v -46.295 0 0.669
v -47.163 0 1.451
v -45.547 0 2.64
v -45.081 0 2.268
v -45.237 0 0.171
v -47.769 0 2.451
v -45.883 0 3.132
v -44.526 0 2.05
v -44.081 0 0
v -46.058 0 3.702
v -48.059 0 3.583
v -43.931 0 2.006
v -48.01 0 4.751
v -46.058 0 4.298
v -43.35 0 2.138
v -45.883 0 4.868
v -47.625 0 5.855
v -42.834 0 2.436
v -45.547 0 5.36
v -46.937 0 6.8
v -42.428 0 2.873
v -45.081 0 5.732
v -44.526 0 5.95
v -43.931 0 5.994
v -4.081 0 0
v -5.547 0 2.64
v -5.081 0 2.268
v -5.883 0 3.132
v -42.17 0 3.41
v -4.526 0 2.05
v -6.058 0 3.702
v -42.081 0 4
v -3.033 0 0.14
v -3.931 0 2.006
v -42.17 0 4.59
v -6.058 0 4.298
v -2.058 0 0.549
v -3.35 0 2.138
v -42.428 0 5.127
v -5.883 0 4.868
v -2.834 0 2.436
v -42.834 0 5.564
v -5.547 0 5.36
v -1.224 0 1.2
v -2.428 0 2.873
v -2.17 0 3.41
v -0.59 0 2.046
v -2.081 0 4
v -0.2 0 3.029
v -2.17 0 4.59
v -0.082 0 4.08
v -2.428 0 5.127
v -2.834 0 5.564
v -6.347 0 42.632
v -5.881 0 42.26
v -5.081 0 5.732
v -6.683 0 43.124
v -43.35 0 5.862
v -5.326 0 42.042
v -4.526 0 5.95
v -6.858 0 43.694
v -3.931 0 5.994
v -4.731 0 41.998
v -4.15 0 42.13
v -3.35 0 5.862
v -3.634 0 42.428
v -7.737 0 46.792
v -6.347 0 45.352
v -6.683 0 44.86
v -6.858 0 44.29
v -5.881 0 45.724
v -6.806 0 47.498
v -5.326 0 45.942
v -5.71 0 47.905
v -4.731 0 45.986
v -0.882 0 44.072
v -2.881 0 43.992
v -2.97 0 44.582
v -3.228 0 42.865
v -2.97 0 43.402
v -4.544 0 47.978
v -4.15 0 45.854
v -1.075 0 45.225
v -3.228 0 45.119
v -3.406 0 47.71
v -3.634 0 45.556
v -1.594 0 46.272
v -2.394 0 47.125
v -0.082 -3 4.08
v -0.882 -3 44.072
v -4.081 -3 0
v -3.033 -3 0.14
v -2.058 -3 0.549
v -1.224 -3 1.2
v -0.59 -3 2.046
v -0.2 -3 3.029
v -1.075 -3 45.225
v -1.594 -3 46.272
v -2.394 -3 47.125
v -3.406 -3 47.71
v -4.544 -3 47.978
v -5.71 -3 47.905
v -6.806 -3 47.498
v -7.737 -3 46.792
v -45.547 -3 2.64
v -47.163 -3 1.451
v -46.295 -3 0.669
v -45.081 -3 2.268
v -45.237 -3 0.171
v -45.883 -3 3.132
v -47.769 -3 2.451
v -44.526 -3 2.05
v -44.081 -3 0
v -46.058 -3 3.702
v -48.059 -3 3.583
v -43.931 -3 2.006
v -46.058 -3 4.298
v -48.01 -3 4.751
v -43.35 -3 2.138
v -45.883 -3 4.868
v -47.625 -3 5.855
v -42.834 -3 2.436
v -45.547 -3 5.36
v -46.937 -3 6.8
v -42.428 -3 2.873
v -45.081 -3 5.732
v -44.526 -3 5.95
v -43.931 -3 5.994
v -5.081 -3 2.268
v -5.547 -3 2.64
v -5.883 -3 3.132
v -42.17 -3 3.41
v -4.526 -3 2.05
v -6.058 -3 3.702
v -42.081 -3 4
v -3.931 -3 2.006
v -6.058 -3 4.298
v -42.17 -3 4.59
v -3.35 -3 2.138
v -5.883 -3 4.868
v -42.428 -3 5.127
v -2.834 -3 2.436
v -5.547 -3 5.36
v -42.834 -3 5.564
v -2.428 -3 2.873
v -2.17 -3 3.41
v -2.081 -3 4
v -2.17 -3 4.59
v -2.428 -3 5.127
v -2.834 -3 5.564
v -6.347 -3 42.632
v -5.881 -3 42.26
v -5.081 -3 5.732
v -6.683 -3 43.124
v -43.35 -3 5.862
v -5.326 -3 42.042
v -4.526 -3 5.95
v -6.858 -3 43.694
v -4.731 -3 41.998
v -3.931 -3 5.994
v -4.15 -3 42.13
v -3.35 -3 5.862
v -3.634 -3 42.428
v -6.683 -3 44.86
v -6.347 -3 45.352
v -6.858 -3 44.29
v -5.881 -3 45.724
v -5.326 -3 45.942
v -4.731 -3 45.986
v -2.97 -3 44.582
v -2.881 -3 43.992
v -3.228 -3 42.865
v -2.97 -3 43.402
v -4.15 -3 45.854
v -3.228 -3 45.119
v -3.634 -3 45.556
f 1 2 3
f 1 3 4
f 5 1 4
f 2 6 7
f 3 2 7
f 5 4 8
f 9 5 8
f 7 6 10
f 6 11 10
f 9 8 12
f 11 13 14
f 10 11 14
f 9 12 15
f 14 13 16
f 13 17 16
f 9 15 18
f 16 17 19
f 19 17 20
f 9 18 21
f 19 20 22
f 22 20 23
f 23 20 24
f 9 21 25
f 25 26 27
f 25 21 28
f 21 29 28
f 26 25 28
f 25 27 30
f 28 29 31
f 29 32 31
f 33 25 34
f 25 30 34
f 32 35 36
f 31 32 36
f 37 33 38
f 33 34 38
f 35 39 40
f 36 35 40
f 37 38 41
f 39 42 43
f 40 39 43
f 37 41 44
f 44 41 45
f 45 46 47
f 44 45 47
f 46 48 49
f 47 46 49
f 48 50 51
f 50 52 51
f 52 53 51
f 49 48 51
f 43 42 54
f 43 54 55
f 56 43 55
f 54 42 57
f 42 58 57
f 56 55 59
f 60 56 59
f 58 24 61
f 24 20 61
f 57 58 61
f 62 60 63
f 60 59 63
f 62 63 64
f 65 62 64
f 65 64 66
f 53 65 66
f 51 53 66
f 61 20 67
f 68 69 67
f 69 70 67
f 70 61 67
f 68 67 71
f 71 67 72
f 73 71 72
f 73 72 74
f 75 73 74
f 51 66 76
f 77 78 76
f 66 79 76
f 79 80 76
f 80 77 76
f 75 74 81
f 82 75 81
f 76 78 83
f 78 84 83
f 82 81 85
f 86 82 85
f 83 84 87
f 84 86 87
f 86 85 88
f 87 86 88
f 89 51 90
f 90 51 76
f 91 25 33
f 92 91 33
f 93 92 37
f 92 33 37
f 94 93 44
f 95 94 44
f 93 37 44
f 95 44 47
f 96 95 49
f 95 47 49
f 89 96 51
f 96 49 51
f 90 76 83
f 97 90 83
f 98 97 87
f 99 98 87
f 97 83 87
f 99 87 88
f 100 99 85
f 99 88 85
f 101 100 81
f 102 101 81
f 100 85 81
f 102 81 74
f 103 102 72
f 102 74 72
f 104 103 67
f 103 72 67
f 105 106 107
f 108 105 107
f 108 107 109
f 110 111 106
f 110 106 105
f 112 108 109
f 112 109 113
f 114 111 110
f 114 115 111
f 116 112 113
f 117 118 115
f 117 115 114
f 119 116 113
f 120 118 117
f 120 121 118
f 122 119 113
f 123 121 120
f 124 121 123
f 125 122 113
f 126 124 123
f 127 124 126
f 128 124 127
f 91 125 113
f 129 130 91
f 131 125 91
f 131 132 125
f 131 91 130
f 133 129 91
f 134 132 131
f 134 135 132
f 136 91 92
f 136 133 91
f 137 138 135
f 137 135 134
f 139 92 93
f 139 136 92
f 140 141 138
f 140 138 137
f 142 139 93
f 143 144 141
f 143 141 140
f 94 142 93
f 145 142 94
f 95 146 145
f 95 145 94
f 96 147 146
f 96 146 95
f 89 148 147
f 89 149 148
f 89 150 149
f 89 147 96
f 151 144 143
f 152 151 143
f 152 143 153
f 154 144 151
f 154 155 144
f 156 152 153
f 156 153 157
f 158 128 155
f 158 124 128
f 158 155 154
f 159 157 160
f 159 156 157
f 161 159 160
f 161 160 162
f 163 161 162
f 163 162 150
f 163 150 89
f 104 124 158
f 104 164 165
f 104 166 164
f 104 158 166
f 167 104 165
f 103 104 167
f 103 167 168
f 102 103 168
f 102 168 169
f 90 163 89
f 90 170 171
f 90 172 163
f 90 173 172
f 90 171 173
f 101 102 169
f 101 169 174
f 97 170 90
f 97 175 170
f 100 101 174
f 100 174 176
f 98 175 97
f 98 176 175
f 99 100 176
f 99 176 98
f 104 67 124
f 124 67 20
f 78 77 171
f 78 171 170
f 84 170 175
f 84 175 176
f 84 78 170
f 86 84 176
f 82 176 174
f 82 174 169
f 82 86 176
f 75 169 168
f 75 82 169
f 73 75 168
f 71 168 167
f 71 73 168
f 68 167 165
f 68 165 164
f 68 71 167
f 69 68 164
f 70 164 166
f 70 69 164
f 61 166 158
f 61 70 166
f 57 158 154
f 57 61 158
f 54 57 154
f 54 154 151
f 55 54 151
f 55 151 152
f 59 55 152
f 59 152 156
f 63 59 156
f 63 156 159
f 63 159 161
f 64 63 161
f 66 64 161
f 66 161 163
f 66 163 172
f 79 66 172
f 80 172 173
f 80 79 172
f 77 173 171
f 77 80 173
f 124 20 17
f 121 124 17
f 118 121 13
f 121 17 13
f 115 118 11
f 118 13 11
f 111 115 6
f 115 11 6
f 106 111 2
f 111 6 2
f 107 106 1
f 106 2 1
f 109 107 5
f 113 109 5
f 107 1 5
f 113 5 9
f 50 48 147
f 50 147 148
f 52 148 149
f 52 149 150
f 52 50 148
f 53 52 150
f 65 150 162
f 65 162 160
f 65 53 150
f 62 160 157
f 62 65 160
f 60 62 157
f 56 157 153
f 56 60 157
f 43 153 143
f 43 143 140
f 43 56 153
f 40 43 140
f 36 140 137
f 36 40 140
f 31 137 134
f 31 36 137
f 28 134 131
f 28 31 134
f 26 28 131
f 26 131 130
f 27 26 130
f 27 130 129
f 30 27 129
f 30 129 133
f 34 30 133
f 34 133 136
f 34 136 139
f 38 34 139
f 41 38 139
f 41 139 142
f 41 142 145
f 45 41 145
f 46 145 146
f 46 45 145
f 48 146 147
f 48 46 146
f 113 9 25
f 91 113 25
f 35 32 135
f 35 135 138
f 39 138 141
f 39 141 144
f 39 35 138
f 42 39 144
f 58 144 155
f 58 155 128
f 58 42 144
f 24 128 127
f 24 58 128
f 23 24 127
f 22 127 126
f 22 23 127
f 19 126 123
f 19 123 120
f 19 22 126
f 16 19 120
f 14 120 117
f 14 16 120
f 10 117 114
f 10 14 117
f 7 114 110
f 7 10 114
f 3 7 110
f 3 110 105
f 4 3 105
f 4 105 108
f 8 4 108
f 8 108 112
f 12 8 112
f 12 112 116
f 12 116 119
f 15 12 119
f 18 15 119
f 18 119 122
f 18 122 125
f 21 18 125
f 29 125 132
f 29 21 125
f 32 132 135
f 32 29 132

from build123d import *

# Parameters (mm, degrees)
F0_R     = 2
F1_DEPTH = 3


with BuildPart() as f1:
    # F0 (on Front) → F1 (new body)
    with BuildSketch(Plane.XZ):
        with BuildLine():
            ThreePointArc((-4.080816, 0), (-1.224245, 1.2), (-0.081616, 4.08))
            Line((-0.081616, 4.08), (-0.881616, 44.071999))
            ThreePointArc((-0.881616, 44.071999), (-3.405689, 47.710063), (-7.737388, 46.791999))
            Line((-7.737388, 46.791999), (-46.937388, 6.8))
            ThreePointArc((-46.937388, 6.8), (-47.768634, 2.450807), (-44.080816, 0))
            Line((-44.080816, 0), (-4.080816, 0))
        make_face()
        with Locations((-44.080816, 4)):
            Circle(F0_R, mode=Mode.SUBTRACT)
        with Locations((-4.080816, 4)):
            Circle(F0_R, mode=Mode.SUBTRACT)
        with Locations((-4.880816, 43.991999)):
            Circle(F0_R, mode=Mode.SUBTRACT)
    extrude(amount=F1_DEPTH)


solid = f1.part
